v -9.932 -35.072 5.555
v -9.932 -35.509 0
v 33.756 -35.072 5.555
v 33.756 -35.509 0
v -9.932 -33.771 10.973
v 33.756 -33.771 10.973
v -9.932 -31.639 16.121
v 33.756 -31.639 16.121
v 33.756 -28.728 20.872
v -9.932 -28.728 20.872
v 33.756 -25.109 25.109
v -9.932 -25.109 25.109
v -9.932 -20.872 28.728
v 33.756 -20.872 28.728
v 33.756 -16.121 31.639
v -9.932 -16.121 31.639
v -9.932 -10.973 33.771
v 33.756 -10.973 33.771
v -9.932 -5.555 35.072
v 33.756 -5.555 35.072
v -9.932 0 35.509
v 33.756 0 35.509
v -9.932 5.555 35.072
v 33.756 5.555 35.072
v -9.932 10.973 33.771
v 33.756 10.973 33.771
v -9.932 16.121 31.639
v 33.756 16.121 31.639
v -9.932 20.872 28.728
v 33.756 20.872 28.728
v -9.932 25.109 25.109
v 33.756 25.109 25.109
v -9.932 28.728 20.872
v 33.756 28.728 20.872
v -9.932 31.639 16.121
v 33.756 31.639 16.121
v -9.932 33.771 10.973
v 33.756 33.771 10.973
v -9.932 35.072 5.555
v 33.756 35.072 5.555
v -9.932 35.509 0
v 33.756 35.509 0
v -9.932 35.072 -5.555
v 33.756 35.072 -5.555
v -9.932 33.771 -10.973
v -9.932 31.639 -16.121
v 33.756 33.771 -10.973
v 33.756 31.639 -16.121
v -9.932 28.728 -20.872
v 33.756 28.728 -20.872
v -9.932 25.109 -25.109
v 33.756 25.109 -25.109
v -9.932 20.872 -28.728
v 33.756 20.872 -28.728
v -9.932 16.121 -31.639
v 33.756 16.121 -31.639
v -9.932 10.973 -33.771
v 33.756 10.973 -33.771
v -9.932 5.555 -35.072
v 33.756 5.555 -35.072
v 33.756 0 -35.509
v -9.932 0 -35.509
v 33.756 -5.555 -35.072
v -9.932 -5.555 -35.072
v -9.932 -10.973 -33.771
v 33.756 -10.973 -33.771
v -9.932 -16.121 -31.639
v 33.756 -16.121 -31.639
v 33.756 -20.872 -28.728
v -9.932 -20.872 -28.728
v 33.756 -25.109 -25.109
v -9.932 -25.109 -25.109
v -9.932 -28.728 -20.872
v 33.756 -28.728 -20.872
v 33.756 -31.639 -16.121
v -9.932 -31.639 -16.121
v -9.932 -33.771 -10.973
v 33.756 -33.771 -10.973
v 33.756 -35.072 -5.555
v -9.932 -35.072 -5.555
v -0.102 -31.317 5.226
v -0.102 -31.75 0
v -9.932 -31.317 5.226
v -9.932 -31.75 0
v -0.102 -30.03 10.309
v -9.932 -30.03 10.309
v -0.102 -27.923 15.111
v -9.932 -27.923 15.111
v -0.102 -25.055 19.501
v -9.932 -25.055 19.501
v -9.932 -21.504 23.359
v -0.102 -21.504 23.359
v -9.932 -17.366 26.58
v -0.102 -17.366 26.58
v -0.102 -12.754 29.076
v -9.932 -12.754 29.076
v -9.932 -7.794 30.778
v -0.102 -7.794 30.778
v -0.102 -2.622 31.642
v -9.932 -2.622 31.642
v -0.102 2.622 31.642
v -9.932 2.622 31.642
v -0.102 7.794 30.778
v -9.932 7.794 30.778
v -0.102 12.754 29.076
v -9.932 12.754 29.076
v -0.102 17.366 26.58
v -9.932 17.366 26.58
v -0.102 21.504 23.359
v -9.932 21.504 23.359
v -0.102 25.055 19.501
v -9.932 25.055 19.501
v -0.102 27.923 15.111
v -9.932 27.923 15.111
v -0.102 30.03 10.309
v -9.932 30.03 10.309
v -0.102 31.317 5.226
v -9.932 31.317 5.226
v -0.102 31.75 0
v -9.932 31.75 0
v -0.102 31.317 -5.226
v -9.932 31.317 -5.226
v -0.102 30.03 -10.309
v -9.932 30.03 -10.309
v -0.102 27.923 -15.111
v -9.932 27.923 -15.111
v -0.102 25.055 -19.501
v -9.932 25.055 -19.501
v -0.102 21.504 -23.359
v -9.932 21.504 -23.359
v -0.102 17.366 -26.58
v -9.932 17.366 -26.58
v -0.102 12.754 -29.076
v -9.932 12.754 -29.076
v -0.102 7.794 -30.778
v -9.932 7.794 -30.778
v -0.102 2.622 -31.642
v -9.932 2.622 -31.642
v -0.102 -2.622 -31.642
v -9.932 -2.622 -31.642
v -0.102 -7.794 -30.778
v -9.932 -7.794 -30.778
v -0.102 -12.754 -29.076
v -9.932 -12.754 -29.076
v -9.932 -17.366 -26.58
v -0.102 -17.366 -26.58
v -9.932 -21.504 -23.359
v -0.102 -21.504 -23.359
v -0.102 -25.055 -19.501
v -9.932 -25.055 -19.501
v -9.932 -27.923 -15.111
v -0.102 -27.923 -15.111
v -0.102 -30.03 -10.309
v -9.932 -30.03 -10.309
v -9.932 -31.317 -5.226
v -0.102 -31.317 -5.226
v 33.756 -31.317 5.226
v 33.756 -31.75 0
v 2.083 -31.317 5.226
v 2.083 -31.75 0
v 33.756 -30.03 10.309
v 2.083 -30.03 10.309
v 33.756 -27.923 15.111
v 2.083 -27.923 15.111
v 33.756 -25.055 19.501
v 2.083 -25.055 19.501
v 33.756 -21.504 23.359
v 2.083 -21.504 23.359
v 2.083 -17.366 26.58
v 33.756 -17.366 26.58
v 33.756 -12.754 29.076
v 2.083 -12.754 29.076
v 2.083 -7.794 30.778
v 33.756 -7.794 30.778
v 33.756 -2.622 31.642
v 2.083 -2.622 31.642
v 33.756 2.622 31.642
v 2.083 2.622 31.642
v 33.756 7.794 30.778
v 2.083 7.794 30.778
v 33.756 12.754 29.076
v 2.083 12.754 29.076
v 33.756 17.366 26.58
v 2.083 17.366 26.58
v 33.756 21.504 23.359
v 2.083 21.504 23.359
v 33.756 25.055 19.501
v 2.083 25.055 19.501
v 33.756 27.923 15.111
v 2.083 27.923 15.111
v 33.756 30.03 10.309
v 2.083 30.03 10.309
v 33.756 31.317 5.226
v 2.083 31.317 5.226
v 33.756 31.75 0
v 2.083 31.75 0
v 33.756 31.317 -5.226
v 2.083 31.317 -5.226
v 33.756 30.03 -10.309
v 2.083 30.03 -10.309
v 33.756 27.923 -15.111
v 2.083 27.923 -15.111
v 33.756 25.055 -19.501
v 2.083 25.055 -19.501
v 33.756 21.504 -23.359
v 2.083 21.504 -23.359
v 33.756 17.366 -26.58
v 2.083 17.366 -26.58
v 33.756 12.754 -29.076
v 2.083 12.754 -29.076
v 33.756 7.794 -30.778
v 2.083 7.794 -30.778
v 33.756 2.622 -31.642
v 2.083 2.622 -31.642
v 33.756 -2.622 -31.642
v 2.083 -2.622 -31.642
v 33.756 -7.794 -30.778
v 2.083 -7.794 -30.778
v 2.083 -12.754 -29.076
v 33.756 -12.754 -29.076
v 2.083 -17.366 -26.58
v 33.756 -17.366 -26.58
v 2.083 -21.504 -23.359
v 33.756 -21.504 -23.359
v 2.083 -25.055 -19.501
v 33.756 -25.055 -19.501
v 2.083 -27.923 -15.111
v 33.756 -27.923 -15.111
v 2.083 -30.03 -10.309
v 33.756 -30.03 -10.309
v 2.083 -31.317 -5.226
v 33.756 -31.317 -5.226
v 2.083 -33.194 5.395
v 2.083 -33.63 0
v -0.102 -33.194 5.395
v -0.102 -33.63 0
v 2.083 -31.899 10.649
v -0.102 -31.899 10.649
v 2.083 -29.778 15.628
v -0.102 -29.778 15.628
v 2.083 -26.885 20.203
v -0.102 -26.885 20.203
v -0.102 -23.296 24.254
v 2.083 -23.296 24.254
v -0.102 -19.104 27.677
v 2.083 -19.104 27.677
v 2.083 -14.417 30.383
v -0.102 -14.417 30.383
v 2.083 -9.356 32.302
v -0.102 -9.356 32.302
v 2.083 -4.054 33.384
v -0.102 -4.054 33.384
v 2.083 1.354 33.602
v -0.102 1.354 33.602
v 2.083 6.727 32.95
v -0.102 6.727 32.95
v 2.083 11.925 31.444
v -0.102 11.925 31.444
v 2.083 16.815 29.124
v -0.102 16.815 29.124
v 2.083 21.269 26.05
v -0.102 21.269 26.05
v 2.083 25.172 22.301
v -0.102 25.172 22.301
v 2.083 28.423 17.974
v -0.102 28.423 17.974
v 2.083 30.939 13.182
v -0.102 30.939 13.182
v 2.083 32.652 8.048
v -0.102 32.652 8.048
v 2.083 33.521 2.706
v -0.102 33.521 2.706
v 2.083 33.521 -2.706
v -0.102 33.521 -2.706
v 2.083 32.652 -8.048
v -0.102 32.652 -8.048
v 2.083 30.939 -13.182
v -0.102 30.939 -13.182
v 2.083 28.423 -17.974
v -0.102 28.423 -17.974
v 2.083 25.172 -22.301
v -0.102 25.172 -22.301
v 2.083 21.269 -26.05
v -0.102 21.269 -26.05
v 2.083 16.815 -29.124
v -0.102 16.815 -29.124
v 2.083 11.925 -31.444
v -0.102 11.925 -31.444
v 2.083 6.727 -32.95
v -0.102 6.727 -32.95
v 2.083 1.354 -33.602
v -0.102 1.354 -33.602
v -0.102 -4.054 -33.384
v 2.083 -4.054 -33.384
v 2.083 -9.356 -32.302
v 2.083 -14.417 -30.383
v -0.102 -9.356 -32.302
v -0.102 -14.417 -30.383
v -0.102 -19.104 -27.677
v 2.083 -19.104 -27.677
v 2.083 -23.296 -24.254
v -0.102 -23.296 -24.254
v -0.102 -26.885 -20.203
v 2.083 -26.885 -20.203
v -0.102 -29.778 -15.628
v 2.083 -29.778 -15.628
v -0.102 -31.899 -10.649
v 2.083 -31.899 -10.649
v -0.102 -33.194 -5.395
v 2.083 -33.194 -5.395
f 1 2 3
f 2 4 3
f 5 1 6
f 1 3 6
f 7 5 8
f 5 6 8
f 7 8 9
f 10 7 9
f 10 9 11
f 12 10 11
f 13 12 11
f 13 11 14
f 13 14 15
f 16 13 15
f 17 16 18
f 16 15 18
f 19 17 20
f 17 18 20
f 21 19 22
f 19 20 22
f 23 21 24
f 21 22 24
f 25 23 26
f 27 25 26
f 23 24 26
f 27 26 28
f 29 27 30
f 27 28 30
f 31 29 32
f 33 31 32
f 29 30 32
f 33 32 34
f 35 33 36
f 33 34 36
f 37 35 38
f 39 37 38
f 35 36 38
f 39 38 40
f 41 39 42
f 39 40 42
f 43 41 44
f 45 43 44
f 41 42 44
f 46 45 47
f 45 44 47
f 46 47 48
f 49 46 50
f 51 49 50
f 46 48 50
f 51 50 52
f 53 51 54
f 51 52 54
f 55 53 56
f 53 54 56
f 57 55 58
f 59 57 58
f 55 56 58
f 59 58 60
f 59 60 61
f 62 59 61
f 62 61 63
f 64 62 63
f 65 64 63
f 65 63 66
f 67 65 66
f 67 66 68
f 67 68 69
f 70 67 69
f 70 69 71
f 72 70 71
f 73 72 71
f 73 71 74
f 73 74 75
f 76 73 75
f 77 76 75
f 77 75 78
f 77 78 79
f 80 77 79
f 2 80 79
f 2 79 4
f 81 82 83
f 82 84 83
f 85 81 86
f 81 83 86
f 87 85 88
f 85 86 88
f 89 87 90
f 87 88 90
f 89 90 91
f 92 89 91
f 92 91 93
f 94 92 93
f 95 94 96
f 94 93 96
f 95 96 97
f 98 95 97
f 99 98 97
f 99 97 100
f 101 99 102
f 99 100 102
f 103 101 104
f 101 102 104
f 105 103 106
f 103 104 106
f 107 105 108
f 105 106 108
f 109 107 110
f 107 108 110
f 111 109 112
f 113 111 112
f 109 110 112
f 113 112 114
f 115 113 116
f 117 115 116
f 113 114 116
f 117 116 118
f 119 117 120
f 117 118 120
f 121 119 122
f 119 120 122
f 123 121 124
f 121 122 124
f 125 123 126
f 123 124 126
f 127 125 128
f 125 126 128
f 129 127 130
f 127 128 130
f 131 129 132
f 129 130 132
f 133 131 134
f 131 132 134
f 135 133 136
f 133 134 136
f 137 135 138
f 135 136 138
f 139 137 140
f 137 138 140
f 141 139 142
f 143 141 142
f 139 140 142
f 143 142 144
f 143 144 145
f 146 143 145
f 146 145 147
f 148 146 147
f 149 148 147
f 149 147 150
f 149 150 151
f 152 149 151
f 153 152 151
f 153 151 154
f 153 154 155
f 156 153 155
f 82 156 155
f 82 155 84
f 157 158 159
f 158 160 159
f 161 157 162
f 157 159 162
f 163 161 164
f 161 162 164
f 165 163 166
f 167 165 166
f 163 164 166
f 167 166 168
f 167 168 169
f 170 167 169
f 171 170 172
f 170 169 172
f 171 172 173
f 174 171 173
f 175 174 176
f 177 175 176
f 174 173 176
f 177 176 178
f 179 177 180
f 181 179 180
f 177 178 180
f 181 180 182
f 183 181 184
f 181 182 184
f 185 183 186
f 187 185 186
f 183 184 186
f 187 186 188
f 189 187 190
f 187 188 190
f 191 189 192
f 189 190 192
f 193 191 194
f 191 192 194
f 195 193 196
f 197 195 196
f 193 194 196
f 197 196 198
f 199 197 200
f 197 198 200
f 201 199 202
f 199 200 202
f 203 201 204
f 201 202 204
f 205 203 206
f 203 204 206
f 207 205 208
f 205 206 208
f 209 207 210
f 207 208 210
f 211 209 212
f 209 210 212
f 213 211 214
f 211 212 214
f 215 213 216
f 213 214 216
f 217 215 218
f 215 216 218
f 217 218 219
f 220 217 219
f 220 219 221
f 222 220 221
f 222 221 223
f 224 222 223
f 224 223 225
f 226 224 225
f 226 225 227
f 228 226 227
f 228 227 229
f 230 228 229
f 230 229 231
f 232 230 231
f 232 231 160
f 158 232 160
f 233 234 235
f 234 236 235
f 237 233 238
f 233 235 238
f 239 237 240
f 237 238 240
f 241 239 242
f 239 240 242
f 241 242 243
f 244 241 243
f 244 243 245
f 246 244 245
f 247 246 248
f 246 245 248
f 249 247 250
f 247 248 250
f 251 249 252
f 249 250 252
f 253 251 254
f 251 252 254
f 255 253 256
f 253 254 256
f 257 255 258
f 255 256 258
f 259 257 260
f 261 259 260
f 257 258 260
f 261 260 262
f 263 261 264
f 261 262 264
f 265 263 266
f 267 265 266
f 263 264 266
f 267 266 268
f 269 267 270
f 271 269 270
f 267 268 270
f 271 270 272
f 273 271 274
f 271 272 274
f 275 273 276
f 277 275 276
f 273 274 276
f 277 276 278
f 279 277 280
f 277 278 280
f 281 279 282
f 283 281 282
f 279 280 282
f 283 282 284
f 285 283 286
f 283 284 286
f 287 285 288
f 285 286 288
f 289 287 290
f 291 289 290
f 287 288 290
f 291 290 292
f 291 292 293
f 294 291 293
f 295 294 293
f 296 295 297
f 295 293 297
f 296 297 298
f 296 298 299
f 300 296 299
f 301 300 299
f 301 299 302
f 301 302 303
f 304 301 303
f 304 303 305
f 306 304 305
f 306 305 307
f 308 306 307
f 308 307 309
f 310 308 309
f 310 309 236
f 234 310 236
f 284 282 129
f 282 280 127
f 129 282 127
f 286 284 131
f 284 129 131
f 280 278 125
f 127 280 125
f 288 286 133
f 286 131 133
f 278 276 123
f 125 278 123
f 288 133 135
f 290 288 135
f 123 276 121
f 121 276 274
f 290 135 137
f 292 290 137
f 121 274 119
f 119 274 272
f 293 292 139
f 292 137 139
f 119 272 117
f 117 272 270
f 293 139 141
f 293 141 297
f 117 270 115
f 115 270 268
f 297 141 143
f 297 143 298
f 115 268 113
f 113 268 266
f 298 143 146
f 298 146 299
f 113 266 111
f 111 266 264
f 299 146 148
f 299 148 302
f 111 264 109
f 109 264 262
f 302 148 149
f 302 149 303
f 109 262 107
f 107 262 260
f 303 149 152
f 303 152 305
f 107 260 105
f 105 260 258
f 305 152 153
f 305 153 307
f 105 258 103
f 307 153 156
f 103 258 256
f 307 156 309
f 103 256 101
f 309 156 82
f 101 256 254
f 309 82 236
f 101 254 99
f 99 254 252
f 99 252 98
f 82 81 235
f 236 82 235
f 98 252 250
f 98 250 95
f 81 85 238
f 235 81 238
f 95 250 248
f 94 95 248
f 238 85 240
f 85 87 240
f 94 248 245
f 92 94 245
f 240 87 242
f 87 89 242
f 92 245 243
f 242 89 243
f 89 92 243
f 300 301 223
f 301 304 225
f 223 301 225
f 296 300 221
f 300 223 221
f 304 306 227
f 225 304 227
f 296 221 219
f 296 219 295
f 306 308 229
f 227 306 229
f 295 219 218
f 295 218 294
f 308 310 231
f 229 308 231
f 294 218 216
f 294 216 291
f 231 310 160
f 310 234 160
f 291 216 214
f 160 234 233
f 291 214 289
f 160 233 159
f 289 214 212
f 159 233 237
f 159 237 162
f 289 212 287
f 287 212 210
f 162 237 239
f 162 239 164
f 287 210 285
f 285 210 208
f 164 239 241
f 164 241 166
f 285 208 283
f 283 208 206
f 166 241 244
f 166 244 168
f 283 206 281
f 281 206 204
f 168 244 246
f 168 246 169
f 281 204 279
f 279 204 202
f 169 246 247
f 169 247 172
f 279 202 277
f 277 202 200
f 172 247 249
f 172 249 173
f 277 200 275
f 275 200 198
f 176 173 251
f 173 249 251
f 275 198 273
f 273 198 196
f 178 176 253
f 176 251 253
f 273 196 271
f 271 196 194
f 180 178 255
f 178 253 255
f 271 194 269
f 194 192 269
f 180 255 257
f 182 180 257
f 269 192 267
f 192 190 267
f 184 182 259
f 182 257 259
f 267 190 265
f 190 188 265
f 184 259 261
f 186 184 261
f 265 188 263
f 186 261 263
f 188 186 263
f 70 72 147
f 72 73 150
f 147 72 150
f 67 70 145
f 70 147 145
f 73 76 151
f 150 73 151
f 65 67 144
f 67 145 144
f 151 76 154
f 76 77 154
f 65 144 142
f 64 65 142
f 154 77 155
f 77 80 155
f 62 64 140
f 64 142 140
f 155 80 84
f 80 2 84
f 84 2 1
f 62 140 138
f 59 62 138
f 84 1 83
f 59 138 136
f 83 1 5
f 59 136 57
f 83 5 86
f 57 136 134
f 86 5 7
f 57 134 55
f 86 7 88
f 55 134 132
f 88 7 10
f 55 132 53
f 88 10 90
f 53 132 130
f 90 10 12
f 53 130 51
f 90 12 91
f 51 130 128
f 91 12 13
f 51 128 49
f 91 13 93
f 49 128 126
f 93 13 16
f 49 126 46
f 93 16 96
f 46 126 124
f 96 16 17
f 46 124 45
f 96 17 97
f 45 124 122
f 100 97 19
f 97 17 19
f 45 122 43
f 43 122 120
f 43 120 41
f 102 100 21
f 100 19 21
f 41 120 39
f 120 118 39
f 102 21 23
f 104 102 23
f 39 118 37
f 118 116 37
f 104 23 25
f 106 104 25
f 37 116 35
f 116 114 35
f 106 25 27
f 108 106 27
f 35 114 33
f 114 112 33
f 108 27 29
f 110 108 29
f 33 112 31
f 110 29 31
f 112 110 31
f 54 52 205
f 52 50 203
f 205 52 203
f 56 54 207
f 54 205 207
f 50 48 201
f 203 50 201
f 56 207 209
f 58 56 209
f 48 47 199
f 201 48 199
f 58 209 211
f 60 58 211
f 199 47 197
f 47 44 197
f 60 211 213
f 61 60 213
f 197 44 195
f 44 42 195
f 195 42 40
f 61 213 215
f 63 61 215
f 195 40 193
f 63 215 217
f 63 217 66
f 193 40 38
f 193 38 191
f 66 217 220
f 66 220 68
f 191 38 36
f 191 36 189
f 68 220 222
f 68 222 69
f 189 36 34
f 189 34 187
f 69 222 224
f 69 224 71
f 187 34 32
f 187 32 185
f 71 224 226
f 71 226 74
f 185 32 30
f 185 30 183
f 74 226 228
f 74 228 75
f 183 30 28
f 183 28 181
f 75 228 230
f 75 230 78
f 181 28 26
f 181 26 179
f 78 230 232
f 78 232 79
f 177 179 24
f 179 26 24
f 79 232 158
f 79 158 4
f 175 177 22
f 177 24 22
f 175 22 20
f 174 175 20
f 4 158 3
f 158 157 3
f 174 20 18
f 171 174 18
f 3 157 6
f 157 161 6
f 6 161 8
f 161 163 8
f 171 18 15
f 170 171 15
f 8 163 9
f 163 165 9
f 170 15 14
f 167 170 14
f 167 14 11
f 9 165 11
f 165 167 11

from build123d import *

# Parameters (mm, degrees)
SWEEP1_PITCH       = 0.704426667
SWEEP1_HEIGHT      = 1.3208
SWEEP1_RADIUS      = 28.5496
SWEEP1_START_ANGLE = 180
SKETCH3_W          = 0.6604
SKETCH3_H          = 5.08
CUT_EXTRUDE4_DEPTH = 0.682414
CUT_EXTRUDE3_DEPTH = 0.682398


with BuildPart() as part:
    # Sweep1: sweep along a helix
    with BuildLine() as sweep1_path:
        add(Helix(SWEEP1_PITCH, SWEEP1_HEIGHT, SWEEP1_RADIUS, center=(0, 0, 0), direction=(1, 0, 0), mode=Mode.PRIVATE).rotate(Axis((0, 0, 0), (1, 0, 0)), SWEEP1_START_ANGLE))
    # Sketch3 → Sweep1 (sweep)
    with BuildSketch(Plane(origin=(0, 0, 0), x_dir=(1, 0, 0), z_dir=(0, 1, 0))):
        with Locations((0.3302, 31.0896)):
            Rectangle(SKETCH3_W, SKETCH3_H)
    sweep(path=sweep1_path.line, is_frenet=True)

    # Sketch8 → Cut-Extrude4 (cut)
    with BuildSketch(Plane(origin=(0, 0, 0), x_dir=(0, 0, -1), z_dir=(1, 0, 0))):
        with BuildLine():
            Line((30.242933333, 0), (33.6296, 0))
            ThreePointArc((33.6296, 0), (33.118690811, 5.839718756), (31.60148696, 11.502000612))
            ThreePointArc((31.60148696, 11.502000612), (30.583748126, 5.790977595), (30.242933333, 0))
        make_face()
    extrude(amount=CUT_EXTRUDE4_DEPTH, mode=Mode.SUBTRACT)

    # Sketch7 → Cut-Extrude3 (cut)
    with BuildSketch(Plane(origin=(1.980679935, 0, 0), x_dir=(0, 0, -1), z_dir=(1, 0, 0))):
        with BuildLine():
            Line((21.384984059, -21.384982427), (23.779719052, -23.779717365))
            ThreePointArc((23.779719052, -23.779717365), (19.289146911, -27.547755038), (14.212483755, -30.478768047))
            ThreePointArc((14.212483755, -30.478768047), (17.531136878, -25.720814646), (21.384984059, -21.384982427))
        make_face()
    extrude(amount=-CUT_EXTRUDE3_DEPTH, mode=Mode.SUBTRACT)


with BuildPart() as body_2:
    # Sketch2 → Revolve1 (revolve)
    with BuildSketch(Plane.XY):
        Polygon((-9.931660032, -31.75), (-9.931660032, -35.5092), (33.756339968, -35.5092), (33.756339968, -31.75), (2.082539968, -31.75), (2.082539968, -33.6296), (-0.101860032, -33.6296), (-0.101860032, -31.75), align=None)
    revolve(axis=Axis((33.756339968, 0, 0), (-1, 0, 0)))


solid = body_2.part
